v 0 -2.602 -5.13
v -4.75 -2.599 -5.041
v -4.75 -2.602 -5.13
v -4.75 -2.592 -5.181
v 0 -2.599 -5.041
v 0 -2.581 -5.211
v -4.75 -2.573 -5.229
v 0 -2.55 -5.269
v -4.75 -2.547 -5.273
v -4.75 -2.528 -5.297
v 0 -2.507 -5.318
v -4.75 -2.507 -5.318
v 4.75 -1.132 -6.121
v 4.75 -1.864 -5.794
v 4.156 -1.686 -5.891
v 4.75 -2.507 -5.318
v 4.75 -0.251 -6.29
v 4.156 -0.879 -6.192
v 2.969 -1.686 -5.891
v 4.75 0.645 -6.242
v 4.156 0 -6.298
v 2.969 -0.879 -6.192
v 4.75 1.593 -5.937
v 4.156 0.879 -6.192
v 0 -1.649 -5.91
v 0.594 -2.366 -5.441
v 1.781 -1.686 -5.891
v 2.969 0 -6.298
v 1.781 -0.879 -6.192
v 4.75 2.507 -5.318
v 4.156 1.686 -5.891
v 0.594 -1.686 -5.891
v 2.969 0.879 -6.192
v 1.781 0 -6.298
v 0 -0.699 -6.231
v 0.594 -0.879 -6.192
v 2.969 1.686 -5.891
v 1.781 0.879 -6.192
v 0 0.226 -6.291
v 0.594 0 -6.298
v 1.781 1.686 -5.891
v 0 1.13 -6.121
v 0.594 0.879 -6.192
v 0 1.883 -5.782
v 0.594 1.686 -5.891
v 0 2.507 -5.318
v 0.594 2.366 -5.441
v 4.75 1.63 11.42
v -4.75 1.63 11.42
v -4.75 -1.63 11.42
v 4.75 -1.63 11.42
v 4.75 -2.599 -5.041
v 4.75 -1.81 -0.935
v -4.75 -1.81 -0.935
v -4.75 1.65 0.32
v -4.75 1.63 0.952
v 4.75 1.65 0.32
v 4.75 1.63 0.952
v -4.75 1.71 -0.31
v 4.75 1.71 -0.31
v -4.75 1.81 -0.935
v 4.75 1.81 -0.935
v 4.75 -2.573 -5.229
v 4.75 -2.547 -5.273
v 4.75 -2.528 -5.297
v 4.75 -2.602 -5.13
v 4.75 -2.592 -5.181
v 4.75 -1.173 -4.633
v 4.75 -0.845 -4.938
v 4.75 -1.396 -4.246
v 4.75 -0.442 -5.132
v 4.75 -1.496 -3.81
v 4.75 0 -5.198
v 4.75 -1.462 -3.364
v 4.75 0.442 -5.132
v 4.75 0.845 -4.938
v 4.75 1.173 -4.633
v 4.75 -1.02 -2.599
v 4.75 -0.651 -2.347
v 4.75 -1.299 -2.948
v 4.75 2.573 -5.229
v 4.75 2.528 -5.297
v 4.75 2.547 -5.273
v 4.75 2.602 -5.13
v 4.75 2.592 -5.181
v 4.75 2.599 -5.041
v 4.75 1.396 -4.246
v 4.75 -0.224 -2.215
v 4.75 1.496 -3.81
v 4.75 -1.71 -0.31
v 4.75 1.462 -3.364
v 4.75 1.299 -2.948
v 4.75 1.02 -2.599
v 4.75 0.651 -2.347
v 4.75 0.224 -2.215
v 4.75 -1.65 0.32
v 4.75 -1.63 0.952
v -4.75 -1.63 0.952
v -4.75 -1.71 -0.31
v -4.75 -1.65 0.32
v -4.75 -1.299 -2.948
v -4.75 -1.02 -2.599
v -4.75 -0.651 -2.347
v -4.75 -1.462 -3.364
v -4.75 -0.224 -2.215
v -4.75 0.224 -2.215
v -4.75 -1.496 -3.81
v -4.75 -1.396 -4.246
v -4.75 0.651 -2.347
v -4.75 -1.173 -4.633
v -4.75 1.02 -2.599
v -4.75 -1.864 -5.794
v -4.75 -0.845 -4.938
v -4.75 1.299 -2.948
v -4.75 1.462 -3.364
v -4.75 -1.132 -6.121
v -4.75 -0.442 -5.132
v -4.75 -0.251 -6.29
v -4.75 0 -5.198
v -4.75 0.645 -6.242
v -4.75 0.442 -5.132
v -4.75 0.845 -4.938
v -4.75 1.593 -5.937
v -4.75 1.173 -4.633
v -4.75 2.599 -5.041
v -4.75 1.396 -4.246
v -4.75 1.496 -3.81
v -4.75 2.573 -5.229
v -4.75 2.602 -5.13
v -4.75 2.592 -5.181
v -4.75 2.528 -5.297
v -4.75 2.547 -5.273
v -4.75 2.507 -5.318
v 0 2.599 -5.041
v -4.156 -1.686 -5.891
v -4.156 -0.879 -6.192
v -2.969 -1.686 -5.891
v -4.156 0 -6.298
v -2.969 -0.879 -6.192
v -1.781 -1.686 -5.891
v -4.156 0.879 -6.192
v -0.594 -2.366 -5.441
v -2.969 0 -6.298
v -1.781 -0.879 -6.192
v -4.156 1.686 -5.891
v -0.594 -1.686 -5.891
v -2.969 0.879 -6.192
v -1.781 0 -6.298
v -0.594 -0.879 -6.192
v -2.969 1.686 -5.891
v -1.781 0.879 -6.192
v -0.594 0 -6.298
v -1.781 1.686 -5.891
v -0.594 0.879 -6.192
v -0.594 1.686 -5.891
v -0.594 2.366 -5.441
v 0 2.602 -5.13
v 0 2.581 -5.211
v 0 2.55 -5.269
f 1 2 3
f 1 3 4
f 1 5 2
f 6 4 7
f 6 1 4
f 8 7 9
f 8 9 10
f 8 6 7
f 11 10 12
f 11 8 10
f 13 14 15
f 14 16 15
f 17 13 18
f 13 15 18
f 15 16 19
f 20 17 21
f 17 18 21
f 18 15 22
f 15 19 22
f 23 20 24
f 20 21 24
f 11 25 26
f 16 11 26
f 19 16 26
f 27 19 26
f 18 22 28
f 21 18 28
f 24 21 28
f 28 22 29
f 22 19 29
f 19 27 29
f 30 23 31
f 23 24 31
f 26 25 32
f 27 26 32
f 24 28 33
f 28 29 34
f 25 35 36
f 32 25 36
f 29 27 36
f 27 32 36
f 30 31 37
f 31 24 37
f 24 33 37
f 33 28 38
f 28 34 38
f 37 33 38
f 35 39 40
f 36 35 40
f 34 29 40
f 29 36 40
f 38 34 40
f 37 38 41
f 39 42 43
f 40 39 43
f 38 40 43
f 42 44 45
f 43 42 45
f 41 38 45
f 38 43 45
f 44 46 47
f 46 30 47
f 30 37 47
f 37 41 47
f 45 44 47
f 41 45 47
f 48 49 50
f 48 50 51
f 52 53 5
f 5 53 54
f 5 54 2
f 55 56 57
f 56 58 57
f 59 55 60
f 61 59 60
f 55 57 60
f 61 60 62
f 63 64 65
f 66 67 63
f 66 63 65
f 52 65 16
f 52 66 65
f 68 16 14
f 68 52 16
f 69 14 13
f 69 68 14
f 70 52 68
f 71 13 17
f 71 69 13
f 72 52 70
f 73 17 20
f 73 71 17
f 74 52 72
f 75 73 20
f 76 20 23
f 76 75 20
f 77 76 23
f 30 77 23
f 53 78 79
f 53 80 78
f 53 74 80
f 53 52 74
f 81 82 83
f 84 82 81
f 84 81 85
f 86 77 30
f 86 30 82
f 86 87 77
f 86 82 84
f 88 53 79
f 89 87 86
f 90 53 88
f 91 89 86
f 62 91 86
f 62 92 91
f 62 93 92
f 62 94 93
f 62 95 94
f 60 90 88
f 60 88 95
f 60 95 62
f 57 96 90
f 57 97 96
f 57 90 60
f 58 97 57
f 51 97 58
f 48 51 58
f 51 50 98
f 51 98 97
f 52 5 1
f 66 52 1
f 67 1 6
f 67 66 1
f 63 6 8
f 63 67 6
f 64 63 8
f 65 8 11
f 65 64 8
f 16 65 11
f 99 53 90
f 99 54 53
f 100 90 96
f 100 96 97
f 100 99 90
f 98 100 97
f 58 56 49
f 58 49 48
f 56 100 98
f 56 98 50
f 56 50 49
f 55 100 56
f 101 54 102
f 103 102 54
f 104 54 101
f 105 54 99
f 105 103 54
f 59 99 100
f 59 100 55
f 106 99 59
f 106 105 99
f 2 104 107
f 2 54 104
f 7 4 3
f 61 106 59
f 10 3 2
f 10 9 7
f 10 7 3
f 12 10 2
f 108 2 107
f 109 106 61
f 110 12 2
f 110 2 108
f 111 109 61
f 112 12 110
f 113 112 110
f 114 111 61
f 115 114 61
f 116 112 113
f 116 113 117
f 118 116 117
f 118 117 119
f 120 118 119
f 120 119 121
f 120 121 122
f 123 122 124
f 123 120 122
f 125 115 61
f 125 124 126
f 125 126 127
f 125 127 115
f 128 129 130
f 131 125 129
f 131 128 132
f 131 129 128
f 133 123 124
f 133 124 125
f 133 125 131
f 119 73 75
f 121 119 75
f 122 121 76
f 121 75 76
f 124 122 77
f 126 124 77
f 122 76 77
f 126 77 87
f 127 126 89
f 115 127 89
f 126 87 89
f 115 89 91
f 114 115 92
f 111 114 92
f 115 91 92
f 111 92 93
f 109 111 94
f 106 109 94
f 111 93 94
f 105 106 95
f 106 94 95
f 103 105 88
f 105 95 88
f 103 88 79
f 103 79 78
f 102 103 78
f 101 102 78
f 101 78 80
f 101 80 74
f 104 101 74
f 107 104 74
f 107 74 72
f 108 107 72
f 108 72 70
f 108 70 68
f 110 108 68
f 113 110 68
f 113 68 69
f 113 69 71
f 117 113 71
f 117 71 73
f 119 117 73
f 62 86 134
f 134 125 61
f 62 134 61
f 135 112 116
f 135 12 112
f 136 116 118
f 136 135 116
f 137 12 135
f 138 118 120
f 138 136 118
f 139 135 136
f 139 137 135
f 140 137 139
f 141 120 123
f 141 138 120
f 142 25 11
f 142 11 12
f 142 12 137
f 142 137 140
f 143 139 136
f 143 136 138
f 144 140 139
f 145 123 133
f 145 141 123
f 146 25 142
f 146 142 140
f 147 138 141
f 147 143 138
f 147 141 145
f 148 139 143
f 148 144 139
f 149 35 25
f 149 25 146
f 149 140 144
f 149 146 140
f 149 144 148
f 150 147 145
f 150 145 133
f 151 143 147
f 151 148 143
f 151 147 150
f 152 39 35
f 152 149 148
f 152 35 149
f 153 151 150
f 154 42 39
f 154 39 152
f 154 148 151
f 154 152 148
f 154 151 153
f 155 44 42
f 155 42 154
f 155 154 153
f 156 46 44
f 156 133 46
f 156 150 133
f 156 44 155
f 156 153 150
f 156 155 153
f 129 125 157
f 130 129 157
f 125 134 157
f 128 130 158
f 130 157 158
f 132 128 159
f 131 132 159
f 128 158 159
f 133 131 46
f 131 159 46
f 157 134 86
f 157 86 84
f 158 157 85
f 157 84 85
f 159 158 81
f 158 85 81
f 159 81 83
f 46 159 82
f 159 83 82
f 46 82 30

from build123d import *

# Parameters (mm, degrees)
SKETCH1_W                       = 9.5
SKETCH1_H                       = 3.26
BOSS_EXTRUDE1_DEPTH             = 11.42
BOSS_EXTRUDE3_REACH             = 14.475
BOSS_EXTRUDE3_DIRECTION_2_REACH = 14.475
FILLET1_R                       = 0.3
SKETCH4_R                       = 1.5
CUT_EXTRUDE1_DEPTH              = 16.081341077
FILLET2_R                       = 10


with BuildPart() as part:
    # Sketch1 → Boss-Extrude1 (new body)
    with BuildSketch(Plane.XY):
        Rectangle(SKETCH1_W, SKETCH1_H)
    extrude(amount=BOSS_EXTRUDE1_DEPTH)

    # Boss-Extrude3: up to this face of the body (flat: up to its plane)
    boss_extrude3_end = Plane(part.part.faces().sort_by_distance((-4.75, 0, 5.71))[0])
    # Sketch3 → Boss-Extrude3 (add, up to the picked face)
    with BuildSketch(Plane(origin=(0, 0, 0), x_dir=(0, 0, -1), z_dir=(1, 0, 0)), mode=Mode.PRIVATE) as boss_extrude3_sk1:
        with BuildLine():
            Line((0, -1.63), (5.2, -2.629157971))
            add(Edge.make_bspline(
                [(5.2, -2.629157971), (5.283052086, -2.547091023), (5.363844635, -2.459497383), (5.60978901, -2.164369944), (5.763042084, -1.936211317), (6.019426683, -1.436050674), (6.122353138, -1.164082205), (6.261824898, -0.594664263), (6.298216306, -0.297392436), (6.298215992, 0.297396341), (6.26182427, 0.594668129), (6.122351908, 1.164085924), (6.019425166, 1.436054284), (5.763040038, 1.936214656), (5.609786724, 2.164373121), (5.363842902, 2.459499262), (5.283051196, 2.547091902), (5.2, 2.629157971)],
                knots=[0.163498388, 0.163498388, 0.163498388, 0.163498388, 0.204239042, 0.204239042, 0.29258857, 0.29258857, 0.380938098, 0.380938098, 0.469287626, 0.469287626, 0.557637154, 0.557637154, 0.645986682, 0.645986682, 0.73433621, 0.73433621, 0.77507641, 0.77507641, 0.77507641, 0.77507641], degree=3))
            Line((5.2, 2.629157971), (0, 1.63))
            Line((0, 1.63), (0, -1.63))
        make_face()
    boss_extrude3_tool1 = split(extrude(boss_extrude3_sk1.sketch, amount=-BOSS_EXTRUDE3_REACH, mode=Mode.PRIVATE), bisect_by=boss_extrude3_end, keep=Keep.BOTH, mode=Mode.PRIVATE)
    add(boss_extrude3_tool1.solids().sort_by(Axis((0, 0, -3.236322), (-1, 0, 0)))[0])

    # Boss-Extrude3 direction 2: up to this face of the body (flat: up to its plane)
    boss_extrude3_direction_2_end = Plane(part.part.faces().sort_by_distance((4.75, 0, 5.71))[0])
    # Sketch3 → Boss-Extrude3 direction 2 (add, up to the picked face)
    with BuildSketch(Plane(origin=(0, 0, 0), x_dir=(0, 0, -1), z_dir=(1, 0, 0)), mode=Mode.PRIVATE) as boss_extrude3_direction_2_sk1:
        with BuildLine():
            Line((0, -1.63), (5.2, -2.629157971))
            add(Edge.make_bspline(
                [(5.2, -2.629157971), (5.283052086, -2.547091023), (5.363844635, -2.459497383), (5.60978901, -2.164369944), (5.763042084, -1.936211317), (6.019426683, -1.436050674), (6.122353138, -1.164082205), (6.261824898, -0.594664263), (6.298216306, -0.297392436), (6.298215992, 0.297396341), (6.26182427, 0.594668129), (6.122351908, 1.164085924), (6.019425166, 1.436054284), (5.763040038, 1.936214656), (5.609786724, 2.164373121), (5.363842902, 2.459499262), (5.283051196, 2.547091902), (5.2, 2.629157971)],
                knots=[0.163498388, 0.163498388, 0.163498388, 0.163498388, 0.204239042, 0.204239042, 0.29258857, 0.29258857, 0.380938098, 0.380938098, 0.469287626, 0.469287626, 0.557637154, 0.557637154, 0.645986682, 0.645986682, 0.73433621, 0.73433621, 0.77507641, 0.77507641, 0.77507641, 0.77507641], degree=3))
            Line((5.2, 2.629157971), (0, 1.63))
            Line((0, 1.63), (0, -1.63))
        make_face()
    boss_extrude3_direction_2_tool1 = split(extrude(boss_extrude3_direction_2_sk1.sketch, amount=BOSS_EXTRUDE3_DIRECTION_2_REACH, mode=Mode.PRIVATE), bisect_by=boss_extrude3_direction_2_end, keep=Keep.BOTH, mode=Mode.PRIVATE)
    add(boss_extrude3_direction_2_tool1.solids().sort_by(Axis((0, 0, -3.236322), (1, 0, 0)))[0])

    # Fillet1
    fillet1_edges = [part.edges().sort_by_distance(p)[0] for p in [
        (2.375, 2.629157971, -5.2),
        (2.375, -2.629157971, -5.2),
    ]]
    fillet(fillet1_edges, radius=FILLET1_R)

    # Sketch4 → Cut-Extrude1 (cut, through all)
    with BuildSketch(Plane(origin=(4.75, 0, 0), x_dir=(0, 0, -1), z_dir=(1, 0, 0))):
        with Locations((3.698216149, 0)):
            Circle(SKETCH4_R)
    extrude(amount=-CUT_EXTRUDE1_DEPTH, mode=Mode.SUBTRACT)

    # Fillet2
    fillet2_edges = [part.edges().sort_by_distance(p)[0] for p in [
        (0, 1.63, 0),
        (0, -1.63, 0),
    ]]
    fillet(fillet2_edges, radius=FILLET2_R)


solid = part.part
